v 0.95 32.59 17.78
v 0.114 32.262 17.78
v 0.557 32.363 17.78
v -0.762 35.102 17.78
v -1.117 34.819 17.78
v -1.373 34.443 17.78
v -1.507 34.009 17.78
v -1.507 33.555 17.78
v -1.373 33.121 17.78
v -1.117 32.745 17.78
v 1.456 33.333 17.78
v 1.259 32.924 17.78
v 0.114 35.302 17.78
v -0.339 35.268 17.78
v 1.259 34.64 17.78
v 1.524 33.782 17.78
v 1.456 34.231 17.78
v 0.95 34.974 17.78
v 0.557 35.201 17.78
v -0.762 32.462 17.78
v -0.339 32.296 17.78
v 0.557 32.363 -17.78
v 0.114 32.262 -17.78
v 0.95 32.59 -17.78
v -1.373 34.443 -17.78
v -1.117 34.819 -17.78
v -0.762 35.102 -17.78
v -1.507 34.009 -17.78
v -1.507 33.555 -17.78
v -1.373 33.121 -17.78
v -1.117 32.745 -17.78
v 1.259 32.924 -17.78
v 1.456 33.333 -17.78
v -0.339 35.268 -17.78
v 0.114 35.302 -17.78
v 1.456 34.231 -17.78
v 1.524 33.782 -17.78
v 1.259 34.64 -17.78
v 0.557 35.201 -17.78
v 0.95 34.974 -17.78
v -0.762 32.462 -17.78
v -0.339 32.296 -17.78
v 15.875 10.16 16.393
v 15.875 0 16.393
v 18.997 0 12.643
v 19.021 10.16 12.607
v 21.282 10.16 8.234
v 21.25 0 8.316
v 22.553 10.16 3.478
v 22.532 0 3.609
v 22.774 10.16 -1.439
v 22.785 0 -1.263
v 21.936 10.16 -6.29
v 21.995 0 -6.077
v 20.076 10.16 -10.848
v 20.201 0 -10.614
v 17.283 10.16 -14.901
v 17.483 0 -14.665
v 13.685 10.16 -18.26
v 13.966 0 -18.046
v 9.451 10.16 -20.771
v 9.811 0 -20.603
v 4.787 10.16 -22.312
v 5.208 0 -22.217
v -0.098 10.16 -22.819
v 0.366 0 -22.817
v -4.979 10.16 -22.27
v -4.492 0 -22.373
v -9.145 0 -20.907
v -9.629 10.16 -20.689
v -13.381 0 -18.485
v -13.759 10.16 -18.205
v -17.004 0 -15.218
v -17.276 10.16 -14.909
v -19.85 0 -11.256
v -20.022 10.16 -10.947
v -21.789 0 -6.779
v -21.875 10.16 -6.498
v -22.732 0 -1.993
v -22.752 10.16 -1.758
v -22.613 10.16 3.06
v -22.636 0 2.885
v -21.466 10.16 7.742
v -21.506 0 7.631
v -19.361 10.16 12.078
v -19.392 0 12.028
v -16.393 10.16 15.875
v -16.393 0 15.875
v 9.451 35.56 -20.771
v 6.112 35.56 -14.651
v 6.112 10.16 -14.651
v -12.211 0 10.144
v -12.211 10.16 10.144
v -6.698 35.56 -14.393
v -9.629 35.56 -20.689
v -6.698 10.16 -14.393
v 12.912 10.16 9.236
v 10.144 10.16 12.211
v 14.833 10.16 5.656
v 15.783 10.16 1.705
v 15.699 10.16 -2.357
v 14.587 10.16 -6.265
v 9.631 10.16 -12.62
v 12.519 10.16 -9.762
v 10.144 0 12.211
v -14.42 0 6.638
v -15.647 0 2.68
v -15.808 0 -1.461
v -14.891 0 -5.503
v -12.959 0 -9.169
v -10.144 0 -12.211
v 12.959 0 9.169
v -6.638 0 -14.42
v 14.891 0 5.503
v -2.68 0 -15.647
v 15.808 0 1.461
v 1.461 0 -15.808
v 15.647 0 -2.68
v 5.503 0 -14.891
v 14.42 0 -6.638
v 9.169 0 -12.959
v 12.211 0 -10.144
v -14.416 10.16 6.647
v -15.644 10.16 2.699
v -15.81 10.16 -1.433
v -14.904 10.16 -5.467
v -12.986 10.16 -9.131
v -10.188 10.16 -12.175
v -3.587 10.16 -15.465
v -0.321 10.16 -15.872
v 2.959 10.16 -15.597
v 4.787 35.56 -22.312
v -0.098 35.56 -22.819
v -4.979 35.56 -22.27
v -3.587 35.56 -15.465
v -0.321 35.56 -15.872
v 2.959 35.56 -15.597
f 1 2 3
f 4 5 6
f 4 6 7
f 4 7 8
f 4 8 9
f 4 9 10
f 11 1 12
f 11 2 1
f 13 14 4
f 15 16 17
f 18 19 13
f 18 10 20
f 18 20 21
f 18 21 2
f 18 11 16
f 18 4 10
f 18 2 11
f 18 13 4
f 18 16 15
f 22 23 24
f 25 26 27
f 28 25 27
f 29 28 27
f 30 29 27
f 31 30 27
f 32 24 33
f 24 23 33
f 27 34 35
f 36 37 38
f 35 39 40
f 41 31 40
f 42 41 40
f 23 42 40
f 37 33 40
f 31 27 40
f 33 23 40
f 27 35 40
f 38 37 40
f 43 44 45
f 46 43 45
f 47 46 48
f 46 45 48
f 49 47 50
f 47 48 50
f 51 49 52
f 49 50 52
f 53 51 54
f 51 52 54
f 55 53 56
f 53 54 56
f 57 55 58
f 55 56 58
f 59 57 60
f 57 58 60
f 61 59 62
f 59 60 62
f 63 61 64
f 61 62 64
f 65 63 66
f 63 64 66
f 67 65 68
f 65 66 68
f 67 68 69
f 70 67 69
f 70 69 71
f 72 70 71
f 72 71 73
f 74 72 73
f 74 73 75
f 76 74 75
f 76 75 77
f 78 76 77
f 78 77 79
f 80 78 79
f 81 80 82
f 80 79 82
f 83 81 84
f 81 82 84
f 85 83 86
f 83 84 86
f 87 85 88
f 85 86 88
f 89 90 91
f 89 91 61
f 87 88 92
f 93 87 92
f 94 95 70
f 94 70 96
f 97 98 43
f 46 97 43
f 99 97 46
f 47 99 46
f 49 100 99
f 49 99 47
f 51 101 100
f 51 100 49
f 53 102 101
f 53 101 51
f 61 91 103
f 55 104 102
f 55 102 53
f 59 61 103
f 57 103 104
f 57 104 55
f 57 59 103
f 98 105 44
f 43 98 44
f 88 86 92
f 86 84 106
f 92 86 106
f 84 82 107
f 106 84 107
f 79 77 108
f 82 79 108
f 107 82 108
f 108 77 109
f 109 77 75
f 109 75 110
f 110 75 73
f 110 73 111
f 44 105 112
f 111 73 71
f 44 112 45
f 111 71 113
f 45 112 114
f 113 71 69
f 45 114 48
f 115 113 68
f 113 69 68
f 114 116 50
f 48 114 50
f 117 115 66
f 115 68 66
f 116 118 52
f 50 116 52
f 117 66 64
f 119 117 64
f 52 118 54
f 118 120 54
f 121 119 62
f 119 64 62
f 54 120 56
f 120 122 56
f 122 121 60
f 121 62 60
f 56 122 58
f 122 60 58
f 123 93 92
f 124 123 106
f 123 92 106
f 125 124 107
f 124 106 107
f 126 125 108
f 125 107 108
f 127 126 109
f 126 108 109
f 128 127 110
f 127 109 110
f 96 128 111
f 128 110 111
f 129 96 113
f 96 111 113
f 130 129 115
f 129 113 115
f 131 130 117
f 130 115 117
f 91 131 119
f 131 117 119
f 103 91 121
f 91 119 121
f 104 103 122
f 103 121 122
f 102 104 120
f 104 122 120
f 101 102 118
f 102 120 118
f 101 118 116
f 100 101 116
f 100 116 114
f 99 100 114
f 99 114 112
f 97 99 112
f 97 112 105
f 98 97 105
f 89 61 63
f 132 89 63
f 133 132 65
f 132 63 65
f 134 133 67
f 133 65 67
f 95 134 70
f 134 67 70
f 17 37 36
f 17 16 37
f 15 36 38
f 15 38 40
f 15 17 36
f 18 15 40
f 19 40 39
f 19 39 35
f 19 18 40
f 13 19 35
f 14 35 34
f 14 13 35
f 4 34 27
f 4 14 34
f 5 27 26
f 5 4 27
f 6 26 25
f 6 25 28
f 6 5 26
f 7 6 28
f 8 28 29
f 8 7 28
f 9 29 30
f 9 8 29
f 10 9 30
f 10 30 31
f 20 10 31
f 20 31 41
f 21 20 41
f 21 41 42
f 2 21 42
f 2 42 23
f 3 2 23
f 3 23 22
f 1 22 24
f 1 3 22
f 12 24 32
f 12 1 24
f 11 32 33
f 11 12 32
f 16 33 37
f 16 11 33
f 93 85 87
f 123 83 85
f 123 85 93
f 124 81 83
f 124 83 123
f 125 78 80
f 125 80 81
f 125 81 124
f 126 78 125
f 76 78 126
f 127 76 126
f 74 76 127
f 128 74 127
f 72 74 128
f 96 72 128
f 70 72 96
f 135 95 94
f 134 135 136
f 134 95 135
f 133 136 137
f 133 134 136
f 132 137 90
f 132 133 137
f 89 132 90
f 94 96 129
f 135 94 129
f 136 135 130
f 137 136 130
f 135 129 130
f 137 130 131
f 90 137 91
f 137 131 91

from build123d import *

# Parameters (mm, degrees)
BOSS_EXTRUDE1_DEPTH      = 10.16
BOSS_EXTRUDE2_DEPTH      = 25.4
SKETCH10_R               = 1.524
BOSS_EXTRUDE3_DEPTH      = 17.78
BOSS_EXTRUDE3_DEPTH_BACK = 17.78


with BuildPart() as part:
    # Sketch1 → Boss-Extrude1 (new body)
    with BuildSketch(Plane(origin=(0, 0, 0), x_dir=(1, 0, 0), z_dir=(0, 1, 0))):
        with BuildLine():
            Line((-16.392571649, -15.875), (-12.210897172, -10.144437651))
            ThreePointArc((-12.210897172, -10.144437651), (1.461207541, 15.807608849), (10.144437651, -12.210897172))
            Line((10.144437651, -12.210897172), (15.875, -16.392571649))
            ThreePointArc((15.875, -16.392571649), (0.365978423, 22.816618725), (-16.392571649, -15.875))
        make_face()
    extrude(amount=BOSS_EXTRUDE1_DEPTH)

    # Sketch5 → Boss-Extrude2 (add)
    with BuildSketch(Plane(origin=(0, 10.16, 0), x_dir=(1, 0, 0), z_dir=(0, 1, 0))):
        with BuildLine():
            Line((-9.628733509, 20.688632658), (-6.698472134, 14.392570864))
            ThreePointArc((-6.698472134, 14.392570864), (-0.320626088, 15.87176184), (6.111754726, 14.651350763))
            Line((6.111754726, 14.651350763), (9.450800874, 20.770517401))
            ThreePointArc((9.450800874, 20.770517401), (-0.097935098, 22.819343526), (-9.628733509, 20.688632658))
        make_face()
    extrude(amount=BOSS_EXTRUDE2_DEPTH)


with BuildPart() as body_2:
    # Sketch10 → Boss-Extrude3 (new body, two sides)
    with BuildSketch(Plane.XY) as boss_extrude3_sk:
        with Locations((0, 33.782)):
            Circle(SKETCH10_R)
    extrude(amount=BOSS_EXTRUDE3_DEPTH)
    extrude(boss_extrude3_sk.sketch, amount=-BOSS_EXTRUDE3_DEPTH_BACK)


solid = Compound([part.part, body_2.part])
